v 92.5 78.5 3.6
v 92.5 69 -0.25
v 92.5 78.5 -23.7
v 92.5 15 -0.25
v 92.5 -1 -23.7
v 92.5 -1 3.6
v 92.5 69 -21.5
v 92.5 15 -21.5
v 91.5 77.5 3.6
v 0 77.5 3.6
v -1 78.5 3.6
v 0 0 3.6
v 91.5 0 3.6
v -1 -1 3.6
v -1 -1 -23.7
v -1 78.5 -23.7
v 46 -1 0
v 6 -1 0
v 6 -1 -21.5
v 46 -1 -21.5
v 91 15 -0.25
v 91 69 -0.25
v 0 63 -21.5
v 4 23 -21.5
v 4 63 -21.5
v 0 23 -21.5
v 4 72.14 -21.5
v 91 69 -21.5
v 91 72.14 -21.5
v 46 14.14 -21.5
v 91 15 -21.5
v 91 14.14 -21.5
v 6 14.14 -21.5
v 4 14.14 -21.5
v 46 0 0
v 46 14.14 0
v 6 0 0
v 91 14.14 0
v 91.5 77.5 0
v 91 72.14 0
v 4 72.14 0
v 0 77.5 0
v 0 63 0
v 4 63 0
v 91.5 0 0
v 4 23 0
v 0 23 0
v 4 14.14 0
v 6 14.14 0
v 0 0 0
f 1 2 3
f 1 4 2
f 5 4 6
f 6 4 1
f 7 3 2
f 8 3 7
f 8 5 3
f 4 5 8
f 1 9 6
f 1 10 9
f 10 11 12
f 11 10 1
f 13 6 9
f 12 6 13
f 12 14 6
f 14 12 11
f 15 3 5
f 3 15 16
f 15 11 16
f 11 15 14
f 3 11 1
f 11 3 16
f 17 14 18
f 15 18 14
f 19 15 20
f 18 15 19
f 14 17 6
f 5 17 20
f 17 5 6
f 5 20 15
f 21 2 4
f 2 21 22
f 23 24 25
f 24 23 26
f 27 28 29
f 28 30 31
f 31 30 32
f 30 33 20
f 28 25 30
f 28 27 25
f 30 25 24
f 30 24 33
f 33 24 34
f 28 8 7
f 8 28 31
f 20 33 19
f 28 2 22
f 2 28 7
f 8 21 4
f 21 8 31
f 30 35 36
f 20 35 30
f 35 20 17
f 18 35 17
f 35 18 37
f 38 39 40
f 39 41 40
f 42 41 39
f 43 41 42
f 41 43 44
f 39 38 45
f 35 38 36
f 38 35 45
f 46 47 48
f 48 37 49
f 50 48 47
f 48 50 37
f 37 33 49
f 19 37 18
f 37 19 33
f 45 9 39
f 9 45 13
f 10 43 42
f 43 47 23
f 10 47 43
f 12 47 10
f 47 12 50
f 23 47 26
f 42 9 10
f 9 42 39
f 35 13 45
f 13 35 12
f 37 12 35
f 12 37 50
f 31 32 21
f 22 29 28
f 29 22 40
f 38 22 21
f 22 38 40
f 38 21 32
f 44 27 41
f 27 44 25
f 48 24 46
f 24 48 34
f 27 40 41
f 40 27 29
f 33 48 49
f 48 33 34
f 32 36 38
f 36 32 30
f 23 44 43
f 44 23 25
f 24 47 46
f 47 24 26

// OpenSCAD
screen_width = 91.5;
screen_height = 77.5;
screen_depth = 3.8;
module screen() {
  color([0.9, 0.9, 0.9]) cube([screen_width,screen_height,screen_depth]);
}

rpi_width = 87;
rpi_height = 58;
rpi_depth = 21.5;
module rpi() {
  color([0.5, 0.9, 0.5]) translate([4.0,screen_height-rpi_height-5.36,-rpi_depth]) cube([rpi_width, rpi_height, rpi_depth]);
}

module body() {
  translate([-1,-1, -rpi_depth-2.2]){ color([0.5, 0.5, 0.9]) cube([screen_width+2, screen_height+2 ,screen_depth + rpi_depth + 2]);}
}

ethernet_width = 16;

module port_hole() {
  translate([rpi_width, screen_height-rpi_height-4.5, -rpi_depth]) cube([40, 54, 21.25]);
}

module power_hole() {
  translate([6, -8, -rpi_depth]) cube([40, 54, 21.5]);
}

module sd_space() {
  translate([0, 23, -rpi_depth]) cube([40, 40, 21.5]);
}

difference() {
  body();
  port_hole();
  power_hole();
  screen();
  rpi();
  sd_space();
}
